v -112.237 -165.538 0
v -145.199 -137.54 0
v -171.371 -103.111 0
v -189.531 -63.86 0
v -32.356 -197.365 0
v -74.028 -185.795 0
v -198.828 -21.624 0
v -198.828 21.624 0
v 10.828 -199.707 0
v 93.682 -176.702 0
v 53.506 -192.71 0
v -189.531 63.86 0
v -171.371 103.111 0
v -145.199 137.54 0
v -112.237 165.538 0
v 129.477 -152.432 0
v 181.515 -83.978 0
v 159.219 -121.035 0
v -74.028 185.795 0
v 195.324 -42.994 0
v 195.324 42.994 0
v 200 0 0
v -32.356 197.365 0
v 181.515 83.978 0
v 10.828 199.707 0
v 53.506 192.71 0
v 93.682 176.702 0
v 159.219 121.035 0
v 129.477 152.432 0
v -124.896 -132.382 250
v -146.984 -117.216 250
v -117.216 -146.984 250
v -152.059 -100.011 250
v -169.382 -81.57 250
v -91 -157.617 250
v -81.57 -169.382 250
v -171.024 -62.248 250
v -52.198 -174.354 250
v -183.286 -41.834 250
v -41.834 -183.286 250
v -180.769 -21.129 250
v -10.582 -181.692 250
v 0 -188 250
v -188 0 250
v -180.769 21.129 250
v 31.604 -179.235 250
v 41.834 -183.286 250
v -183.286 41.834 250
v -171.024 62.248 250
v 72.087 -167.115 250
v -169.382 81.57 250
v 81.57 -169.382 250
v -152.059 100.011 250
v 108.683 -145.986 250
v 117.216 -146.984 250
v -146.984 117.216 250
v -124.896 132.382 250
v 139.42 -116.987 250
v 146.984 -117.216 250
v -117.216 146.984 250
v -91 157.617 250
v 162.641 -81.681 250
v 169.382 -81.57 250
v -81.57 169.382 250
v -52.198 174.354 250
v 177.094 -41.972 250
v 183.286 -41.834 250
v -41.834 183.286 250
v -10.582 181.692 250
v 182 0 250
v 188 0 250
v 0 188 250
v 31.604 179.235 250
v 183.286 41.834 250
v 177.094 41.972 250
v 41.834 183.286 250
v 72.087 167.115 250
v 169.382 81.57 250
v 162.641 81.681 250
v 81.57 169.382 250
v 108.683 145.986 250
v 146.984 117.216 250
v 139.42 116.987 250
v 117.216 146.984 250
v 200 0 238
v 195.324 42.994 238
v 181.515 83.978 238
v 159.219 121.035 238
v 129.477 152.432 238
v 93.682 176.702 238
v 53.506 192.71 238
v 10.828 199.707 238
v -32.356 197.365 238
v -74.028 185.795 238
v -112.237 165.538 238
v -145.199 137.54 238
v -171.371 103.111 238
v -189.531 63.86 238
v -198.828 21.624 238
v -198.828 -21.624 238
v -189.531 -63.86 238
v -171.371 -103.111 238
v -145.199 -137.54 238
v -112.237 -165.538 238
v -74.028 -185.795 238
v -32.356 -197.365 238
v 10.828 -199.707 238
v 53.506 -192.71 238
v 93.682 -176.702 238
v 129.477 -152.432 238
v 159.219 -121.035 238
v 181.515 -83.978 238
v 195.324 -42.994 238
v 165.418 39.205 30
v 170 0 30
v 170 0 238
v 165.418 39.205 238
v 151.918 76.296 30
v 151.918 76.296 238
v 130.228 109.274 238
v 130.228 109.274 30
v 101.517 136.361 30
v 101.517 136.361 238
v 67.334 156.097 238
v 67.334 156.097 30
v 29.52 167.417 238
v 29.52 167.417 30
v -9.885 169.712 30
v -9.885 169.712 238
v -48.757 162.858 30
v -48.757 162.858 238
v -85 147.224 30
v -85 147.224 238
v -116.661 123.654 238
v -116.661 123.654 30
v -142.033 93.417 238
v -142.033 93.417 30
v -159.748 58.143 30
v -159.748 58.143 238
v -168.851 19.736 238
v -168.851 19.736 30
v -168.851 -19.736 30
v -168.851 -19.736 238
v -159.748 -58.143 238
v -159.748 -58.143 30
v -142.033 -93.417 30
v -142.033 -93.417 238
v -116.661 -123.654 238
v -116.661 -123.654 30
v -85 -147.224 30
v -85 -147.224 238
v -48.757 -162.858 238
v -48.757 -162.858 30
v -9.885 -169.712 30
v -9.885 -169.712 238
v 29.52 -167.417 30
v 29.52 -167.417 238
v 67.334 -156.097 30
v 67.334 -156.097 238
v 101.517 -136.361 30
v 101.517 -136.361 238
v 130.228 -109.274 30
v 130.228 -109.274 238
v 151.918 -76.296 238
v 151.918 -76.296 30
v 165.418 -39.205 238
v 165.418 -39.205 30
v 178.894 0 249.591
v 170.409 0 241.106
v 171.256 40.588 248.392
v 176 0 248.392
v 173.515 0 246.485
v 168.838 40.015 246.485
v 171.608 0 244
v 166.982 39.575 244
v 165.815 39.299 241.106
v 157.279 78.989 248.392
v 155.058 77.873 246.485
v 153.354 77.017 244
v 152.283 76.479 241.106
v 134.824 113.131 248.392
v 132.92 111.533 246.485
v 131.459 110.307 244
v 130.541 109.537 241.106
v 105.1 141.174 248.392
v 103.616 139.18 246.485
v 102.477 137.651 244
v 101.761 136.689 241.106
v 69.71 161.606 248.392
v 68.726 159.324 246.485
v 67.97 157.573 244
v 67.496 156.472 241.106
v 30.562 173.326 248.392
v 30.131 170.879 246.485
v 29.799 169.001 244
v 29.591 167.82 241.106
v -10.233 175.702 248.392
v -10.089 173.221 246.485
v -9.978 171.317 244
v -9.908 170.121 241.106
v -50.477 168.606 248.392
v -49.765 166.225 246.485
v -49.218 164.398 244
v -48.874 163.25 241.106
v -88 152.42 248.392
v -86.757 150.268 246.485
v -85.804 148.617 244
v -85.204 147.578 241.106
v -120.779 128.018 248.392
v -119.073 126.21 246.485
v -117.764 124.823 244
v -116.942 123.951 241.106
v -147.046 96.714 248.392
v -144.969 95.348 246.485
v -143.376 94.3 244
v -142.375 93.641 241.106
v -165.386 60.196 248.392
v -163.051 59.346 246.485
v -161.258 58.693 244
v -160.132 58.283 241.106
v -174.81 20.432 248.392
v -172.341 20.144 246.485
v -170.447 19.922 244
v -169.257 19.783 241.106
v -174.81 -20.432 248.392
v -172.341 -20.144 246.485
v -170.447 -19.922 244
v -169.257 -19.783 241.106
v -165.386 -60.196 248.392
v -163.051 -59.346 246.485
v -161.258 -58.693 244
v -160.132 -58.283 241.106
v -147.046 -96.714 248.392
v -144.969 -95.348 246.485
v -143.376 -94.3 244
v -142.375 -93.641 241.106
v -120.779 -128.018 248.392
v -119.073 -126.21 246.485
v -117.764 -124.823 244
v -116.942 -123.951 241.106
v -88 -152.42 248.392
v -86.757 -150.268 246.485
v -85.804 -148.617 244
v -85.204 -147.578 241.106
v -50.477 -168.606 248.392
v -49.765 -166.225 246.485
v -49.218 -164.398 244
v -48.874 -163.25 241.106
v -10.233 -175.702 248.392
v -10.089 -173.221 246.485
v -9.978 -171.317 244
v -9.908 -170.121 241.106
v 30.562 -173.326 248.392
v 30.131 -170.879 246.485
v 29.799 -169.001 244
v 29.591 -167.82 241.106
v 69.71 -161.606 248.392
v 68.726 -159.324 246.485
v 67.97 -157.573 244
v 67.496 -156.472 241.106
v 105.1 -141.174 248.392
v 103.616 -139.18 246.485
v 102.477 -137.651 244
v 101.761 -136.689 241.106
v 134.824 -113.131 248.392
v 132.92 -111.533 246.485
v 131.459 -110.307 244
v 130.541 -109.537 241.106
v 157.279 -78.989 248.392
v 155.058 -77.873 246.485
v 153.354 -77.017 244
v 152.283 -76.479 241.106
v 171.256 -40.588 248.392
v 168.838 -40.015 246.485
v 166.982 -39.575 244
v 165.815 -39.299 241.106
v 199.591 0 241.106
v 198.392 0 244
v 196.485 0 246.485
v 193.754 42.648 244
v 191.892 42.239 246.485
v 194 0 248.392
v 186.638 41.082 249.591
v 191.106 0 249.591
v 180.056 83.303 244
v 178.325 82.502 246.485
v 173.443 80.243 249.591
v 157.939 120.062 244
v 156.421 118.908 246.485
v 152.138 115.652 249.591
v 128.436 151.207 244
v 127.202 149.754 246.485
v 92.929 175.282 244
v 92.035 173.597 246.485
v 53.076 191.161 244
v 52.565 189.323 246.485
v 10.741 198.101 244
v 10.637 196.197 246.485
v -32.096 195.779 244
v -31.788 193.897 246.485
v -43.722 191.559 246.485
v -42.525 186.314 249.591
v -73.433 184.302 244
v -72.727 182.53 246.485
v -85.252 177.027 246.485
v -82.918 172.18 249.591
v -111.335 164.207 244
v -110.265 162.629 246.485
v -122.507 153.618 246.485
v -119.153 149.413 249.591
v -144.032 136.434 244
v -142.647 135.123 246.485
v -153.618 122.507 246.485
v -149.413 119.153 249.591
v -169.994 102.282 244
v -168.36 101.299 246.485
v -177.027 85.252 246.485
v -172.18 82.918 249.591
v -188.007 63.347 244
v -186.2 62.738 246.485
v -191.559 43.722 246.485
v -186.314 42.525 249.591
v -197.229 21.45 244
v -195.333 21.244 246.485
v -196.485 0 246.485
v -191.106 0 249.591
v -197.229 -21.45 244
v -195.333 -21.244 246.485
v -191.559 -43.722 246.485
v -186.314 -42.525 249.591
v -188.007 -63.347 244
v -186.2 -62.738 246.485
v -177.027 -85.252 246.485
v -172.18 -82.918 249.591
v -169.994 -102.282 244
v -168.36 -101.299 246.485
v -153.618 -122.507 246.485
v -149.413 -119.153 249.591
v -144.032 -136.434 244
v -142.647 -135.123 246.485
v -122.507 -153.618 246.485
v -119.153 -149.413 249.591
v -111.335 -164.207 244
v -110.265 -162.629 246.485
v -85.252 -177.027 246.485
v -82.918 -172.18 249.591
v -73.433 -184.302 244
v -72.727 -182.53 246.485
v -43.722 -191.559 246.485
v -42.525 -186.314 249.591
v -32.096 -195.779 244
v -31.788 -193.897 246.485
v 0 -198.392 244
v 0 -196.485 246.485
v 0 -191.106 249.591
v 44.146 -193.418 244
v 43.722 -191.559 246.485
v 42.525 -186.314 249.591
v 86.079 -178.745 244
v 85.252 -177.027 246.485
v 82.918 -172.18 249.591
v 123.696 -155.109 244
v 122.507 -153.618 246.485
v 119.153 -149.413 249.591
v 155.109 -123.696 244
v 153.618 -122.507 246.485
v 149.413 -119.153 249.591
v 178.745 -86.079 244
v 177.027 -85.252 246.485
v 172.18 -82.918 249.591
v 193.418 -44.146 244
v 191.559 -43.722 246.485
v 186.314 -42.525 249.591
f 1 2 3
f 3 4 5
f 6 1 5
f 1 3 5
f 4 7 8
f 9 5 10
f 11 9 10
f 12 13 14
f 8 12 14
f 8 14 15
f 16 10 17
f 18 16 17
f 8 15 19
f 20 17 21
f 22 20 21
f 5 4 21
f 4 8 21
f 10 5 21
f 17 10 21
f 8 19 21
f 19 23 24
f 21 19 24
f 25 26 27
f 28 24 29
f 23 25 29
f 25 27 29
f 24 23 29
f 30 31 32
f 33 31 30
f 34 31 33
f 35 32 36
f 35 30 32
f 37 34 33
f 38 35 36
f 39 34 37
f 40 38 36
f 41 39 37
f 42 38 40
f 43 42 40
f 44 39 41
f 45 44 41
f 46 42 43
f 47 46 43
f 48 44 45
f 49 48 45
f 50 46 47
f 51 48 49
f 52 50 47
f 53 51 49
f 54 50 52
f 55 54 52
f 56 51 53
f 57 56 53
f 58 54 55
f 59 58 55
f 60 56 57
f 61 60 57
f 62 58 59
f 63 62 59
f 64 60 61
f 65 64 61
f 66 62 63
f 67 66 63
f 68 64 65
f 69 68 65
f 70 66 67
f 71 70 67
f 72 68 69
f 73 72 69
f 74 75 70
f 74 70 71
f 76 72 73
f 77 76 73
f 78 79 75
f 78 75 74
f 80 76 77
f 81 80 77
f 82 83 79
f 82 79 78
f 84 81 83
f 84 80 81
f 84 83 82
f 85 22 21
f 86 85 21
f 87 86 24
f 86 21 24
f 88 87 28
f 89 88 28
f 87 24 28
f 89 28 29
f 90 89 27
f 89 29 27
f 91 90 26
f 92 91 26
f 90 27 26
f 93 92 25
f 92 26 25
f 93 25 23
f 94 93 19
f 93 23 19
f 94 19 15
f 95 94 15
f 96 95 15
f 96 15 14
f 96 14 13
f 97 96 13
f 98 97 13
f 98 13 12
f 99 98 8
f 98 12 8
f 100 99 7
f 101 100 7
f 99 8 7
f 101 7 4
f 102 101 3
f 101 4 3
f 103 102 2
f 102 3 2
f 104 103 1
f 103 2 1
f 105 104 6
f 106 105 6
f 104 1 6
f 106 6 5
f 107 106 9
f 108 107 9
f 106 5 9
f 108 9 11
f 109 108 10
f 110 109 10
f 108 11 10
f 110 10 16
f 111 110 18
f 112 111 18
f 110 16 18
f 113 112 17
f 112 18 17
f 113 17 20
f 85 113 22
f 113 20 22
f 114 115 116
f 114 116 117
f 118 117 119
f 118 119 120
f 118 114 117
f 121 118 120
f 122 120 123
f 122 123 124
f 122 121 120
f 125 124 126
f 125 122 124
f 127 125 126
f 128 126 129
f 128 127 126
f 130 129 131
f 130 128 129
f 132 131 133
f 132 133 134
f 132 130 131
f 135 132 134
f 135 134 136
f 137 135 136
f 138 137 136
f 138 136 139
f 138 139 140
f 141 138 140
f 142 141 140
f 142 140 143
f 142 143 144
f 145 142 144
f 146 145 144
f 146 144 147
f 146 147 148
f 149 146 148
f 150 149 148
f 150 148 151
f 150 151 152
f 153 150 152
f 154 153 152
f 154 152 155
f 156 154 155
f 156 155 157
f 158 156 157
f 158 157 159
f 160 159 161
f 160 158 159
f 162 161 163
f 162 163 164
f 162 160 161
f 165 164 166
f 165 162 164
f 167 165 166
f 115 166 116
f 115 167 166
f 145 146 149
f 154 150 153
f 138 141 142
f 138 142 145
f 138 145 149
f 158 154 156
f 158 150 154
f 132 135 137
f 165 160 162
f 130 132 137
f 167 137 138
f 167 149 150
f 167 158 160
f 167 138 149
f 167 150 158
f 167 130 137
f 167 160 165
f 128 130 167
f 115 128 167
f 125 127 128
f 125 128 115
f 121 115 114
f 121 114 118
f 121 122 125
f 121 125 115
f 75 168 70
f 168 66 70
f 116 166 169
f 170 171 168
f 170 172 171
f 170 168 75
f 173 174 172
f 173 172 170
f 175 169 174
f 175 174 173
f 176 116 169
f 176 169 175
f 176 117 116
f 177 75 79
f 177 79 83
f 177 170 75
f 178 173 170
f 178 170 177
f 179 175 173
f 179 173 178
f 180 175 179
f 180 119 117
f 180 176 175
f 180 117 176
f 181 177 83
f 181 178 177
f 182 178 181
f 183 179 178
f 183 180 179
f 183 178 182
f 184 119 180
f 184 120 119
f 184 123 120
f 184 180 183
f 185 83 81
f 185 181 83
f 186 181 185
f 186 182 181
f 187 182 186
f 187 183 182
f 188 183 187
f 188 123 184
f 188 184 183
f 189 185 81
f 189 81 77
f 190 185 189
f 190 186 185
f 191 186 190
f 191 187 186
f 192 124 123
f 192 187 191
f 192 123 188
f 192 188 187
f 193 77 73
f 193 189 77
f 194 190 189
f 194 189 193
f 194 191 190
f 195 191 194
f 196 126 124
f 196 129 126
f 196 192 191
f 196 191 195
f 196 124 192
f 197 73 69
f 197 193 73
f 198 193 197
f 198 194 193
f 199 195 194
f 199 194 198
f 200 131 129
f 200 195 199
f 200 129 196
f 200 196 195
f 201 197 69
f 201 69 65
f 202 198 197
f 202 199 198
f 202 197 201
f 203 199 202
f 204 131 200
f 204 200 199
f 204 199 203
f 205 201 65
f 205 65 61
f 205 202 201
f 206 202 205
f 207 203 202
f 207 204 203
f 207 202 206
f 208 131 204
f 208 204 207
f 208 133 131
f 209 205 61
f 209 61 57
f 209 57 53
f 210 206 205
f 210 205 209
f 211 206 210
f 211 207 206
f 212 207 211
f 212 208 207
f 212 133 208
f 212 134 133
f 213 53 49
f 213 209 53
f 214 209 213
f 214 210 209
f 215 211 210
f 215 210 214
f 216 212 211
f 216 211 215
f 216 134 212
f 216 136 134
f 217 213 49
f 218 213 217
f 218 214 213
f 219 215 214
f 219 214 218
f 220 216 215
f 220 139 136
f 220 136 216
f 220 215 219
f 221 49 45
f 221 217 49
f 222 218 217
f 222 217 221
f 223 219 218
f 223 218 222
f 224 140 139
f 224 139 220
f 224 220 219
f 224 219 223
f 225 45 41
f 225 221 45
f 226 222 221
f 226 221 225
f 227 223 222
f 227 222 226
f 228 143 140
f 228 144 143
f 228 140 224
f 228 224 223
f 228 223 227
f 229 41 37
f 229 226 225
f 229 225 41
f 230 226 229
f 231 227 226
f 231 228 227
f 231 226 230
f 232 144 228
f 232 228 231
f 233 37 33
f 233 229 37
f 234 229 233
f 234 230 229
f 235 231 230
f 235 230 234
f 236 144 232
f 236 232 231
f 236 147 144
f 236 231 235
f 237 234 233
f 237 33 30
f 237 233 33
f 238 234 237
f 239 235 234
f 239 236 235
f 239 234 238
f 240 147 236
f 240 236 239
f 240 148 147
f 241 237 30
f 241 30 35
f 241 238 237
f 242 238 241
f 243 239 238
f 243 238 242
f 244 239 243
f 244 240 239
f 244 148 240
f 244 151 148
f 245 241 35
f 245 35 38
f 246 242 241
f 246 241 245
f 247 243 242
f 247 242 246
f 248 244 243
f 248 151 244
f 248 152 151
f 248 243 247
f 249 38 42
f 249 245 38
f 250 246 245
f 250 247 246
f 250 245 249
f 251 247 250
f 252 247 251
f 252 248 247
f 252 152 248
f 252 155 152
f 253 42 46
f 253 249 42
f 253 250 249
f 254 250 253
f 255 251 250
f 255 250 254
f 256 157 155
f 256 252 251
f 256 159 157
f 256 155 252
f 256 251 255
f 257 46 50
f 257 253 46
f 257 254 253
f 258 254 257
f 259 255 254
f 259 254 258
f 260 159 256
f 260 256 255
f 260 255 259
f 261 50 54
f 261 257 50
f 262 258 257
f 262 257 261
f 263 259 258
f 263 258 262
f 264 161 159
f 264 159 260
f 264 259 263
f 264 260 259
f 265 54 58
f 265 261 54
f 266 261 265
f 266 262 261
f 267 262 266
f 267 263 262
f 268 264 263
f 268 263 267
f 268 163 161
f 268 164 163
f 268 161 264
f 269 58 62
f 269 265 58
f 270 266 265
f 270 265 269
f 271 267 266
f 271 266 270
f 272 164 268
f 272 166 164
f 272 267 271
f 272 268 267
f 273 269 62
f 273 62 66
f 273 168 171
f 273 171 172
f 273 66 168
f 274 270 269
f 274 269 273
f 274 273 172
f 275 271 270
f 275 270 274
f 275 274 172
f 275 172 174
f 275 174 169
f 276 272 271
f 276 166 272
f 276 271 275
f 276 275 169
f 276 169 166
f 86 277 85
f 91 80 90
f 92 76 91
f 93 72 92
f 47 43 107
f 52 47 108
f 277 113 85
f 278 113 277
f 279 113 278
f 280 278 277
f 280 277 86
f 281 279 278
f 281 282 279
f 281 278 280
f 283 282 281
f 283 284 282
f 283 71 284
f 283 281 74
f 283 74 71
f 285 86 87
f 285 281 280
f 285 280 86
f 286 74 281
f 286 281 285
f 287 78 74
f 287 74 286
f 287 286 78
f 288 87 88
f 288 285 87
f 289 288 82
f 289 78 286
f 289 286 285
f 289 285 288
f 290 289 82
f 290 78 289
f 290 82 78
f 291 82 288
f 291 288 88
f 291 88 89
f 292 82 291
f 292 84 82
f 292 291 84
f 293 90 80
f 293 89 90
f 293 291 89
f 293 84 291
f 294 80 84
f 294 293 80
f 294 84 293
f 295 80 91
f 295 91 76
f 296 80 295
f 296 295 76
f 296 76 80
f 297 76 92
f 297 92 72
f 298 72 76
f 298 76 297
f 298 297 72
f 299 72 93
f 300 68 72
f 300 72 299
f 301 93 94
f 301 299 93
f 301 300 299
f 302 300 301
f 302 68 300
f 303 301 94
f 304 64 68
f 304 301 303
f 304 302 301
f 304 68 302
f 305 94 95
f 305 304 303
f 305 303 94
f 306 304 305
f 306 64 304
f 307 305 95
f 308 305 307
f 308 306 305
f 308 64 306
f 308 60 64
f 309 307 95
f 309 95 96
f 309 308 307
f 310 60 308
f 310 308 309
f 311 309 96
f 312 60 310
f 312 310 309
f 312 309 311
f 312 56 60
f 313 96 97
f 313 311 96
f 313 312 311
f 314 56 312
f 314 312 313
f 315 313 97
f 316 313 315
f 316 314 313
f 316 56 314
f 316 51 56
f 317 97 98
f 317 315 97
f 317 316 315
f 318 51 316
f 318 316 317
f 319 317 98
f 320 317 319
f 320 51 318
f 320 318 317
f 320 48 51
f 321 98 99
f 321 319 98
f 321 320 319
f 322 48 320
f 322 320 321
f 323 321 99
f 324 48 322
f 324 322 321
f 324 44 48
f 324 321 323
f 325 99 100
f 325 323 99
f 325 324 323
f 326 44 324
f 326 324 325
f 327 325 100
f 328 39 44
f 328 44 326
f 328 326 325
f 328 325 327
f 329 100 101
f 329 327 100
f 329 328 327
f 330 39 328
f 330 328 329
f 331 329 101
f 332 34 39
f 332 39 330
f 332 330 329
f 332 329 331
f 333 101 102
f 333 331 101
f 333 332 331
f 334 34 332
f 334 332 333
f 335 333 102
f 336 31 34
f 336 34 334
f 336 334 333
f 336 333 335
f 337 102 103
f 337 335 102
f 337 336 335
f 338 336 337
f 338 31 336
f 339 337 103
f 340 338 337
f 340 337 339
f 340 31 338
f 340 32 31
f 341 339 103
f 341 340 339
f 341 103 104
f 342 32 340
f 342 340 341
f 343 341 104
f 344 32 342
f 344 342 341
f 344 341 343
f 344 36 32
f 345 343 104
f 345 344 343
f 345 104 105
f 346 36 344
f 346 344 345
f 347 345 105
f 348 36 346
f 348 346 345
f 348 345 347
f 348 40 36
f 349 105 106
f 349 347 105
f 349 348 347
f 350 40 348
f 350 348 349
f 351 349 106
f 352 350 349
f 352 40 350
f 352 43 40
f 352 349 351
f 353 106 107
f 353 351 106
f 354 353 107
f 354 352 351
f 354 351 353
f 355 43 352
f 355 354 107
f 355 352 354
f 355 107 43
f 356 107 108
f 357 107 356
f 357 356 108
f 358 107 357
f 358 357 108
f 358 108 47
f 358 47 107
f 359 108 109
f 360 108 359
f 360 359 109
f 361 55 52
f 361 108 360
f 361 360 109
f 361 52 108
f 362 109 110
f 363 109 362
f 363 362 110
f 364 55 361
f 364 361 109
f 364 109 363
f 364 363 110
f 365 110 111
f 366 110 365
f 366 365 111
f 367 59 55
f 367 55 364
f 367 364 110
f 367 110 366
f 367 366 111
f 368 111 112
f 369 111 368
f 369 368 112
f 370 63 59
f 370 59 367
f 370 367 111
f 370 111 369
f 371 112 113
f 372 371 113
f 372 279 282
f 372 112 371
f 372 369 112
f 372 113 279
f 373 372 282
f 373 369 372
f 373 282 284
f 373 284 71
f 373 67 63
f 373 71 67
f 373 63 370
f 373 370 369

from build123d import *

# Parameters (mm, degrees)
F0_R     = 200
F0_R_2   = 170
F1_DEPTH = 250
F2_R     = 170
F3_DEPTH = 30
F4_R     = 12


with BuildPart() as f1:
    # F0 (on Top) → F1 (new body)
    with BuildSketch(Plane.XY):
        Circle(F0_R)
        Circle(F0_R_2, mode=Mode.SUBTRACT)
    extrude(amount=F1_DEPTH)

    # F2 (on Top) → F3 (join)
    with BuildSketch(Plane.XY):
        Circle(F2_R)
    extrude(amount=F3_DEPTH)

    # F4
    f4_edges = [f1.edges().sort_by_distance(p)[0] for p in [
        (-170, 0, 250),
        (-200, 0, 250),
    ]]
    fillet(f4_edges, radius=F4_R)


solid = f1.part
